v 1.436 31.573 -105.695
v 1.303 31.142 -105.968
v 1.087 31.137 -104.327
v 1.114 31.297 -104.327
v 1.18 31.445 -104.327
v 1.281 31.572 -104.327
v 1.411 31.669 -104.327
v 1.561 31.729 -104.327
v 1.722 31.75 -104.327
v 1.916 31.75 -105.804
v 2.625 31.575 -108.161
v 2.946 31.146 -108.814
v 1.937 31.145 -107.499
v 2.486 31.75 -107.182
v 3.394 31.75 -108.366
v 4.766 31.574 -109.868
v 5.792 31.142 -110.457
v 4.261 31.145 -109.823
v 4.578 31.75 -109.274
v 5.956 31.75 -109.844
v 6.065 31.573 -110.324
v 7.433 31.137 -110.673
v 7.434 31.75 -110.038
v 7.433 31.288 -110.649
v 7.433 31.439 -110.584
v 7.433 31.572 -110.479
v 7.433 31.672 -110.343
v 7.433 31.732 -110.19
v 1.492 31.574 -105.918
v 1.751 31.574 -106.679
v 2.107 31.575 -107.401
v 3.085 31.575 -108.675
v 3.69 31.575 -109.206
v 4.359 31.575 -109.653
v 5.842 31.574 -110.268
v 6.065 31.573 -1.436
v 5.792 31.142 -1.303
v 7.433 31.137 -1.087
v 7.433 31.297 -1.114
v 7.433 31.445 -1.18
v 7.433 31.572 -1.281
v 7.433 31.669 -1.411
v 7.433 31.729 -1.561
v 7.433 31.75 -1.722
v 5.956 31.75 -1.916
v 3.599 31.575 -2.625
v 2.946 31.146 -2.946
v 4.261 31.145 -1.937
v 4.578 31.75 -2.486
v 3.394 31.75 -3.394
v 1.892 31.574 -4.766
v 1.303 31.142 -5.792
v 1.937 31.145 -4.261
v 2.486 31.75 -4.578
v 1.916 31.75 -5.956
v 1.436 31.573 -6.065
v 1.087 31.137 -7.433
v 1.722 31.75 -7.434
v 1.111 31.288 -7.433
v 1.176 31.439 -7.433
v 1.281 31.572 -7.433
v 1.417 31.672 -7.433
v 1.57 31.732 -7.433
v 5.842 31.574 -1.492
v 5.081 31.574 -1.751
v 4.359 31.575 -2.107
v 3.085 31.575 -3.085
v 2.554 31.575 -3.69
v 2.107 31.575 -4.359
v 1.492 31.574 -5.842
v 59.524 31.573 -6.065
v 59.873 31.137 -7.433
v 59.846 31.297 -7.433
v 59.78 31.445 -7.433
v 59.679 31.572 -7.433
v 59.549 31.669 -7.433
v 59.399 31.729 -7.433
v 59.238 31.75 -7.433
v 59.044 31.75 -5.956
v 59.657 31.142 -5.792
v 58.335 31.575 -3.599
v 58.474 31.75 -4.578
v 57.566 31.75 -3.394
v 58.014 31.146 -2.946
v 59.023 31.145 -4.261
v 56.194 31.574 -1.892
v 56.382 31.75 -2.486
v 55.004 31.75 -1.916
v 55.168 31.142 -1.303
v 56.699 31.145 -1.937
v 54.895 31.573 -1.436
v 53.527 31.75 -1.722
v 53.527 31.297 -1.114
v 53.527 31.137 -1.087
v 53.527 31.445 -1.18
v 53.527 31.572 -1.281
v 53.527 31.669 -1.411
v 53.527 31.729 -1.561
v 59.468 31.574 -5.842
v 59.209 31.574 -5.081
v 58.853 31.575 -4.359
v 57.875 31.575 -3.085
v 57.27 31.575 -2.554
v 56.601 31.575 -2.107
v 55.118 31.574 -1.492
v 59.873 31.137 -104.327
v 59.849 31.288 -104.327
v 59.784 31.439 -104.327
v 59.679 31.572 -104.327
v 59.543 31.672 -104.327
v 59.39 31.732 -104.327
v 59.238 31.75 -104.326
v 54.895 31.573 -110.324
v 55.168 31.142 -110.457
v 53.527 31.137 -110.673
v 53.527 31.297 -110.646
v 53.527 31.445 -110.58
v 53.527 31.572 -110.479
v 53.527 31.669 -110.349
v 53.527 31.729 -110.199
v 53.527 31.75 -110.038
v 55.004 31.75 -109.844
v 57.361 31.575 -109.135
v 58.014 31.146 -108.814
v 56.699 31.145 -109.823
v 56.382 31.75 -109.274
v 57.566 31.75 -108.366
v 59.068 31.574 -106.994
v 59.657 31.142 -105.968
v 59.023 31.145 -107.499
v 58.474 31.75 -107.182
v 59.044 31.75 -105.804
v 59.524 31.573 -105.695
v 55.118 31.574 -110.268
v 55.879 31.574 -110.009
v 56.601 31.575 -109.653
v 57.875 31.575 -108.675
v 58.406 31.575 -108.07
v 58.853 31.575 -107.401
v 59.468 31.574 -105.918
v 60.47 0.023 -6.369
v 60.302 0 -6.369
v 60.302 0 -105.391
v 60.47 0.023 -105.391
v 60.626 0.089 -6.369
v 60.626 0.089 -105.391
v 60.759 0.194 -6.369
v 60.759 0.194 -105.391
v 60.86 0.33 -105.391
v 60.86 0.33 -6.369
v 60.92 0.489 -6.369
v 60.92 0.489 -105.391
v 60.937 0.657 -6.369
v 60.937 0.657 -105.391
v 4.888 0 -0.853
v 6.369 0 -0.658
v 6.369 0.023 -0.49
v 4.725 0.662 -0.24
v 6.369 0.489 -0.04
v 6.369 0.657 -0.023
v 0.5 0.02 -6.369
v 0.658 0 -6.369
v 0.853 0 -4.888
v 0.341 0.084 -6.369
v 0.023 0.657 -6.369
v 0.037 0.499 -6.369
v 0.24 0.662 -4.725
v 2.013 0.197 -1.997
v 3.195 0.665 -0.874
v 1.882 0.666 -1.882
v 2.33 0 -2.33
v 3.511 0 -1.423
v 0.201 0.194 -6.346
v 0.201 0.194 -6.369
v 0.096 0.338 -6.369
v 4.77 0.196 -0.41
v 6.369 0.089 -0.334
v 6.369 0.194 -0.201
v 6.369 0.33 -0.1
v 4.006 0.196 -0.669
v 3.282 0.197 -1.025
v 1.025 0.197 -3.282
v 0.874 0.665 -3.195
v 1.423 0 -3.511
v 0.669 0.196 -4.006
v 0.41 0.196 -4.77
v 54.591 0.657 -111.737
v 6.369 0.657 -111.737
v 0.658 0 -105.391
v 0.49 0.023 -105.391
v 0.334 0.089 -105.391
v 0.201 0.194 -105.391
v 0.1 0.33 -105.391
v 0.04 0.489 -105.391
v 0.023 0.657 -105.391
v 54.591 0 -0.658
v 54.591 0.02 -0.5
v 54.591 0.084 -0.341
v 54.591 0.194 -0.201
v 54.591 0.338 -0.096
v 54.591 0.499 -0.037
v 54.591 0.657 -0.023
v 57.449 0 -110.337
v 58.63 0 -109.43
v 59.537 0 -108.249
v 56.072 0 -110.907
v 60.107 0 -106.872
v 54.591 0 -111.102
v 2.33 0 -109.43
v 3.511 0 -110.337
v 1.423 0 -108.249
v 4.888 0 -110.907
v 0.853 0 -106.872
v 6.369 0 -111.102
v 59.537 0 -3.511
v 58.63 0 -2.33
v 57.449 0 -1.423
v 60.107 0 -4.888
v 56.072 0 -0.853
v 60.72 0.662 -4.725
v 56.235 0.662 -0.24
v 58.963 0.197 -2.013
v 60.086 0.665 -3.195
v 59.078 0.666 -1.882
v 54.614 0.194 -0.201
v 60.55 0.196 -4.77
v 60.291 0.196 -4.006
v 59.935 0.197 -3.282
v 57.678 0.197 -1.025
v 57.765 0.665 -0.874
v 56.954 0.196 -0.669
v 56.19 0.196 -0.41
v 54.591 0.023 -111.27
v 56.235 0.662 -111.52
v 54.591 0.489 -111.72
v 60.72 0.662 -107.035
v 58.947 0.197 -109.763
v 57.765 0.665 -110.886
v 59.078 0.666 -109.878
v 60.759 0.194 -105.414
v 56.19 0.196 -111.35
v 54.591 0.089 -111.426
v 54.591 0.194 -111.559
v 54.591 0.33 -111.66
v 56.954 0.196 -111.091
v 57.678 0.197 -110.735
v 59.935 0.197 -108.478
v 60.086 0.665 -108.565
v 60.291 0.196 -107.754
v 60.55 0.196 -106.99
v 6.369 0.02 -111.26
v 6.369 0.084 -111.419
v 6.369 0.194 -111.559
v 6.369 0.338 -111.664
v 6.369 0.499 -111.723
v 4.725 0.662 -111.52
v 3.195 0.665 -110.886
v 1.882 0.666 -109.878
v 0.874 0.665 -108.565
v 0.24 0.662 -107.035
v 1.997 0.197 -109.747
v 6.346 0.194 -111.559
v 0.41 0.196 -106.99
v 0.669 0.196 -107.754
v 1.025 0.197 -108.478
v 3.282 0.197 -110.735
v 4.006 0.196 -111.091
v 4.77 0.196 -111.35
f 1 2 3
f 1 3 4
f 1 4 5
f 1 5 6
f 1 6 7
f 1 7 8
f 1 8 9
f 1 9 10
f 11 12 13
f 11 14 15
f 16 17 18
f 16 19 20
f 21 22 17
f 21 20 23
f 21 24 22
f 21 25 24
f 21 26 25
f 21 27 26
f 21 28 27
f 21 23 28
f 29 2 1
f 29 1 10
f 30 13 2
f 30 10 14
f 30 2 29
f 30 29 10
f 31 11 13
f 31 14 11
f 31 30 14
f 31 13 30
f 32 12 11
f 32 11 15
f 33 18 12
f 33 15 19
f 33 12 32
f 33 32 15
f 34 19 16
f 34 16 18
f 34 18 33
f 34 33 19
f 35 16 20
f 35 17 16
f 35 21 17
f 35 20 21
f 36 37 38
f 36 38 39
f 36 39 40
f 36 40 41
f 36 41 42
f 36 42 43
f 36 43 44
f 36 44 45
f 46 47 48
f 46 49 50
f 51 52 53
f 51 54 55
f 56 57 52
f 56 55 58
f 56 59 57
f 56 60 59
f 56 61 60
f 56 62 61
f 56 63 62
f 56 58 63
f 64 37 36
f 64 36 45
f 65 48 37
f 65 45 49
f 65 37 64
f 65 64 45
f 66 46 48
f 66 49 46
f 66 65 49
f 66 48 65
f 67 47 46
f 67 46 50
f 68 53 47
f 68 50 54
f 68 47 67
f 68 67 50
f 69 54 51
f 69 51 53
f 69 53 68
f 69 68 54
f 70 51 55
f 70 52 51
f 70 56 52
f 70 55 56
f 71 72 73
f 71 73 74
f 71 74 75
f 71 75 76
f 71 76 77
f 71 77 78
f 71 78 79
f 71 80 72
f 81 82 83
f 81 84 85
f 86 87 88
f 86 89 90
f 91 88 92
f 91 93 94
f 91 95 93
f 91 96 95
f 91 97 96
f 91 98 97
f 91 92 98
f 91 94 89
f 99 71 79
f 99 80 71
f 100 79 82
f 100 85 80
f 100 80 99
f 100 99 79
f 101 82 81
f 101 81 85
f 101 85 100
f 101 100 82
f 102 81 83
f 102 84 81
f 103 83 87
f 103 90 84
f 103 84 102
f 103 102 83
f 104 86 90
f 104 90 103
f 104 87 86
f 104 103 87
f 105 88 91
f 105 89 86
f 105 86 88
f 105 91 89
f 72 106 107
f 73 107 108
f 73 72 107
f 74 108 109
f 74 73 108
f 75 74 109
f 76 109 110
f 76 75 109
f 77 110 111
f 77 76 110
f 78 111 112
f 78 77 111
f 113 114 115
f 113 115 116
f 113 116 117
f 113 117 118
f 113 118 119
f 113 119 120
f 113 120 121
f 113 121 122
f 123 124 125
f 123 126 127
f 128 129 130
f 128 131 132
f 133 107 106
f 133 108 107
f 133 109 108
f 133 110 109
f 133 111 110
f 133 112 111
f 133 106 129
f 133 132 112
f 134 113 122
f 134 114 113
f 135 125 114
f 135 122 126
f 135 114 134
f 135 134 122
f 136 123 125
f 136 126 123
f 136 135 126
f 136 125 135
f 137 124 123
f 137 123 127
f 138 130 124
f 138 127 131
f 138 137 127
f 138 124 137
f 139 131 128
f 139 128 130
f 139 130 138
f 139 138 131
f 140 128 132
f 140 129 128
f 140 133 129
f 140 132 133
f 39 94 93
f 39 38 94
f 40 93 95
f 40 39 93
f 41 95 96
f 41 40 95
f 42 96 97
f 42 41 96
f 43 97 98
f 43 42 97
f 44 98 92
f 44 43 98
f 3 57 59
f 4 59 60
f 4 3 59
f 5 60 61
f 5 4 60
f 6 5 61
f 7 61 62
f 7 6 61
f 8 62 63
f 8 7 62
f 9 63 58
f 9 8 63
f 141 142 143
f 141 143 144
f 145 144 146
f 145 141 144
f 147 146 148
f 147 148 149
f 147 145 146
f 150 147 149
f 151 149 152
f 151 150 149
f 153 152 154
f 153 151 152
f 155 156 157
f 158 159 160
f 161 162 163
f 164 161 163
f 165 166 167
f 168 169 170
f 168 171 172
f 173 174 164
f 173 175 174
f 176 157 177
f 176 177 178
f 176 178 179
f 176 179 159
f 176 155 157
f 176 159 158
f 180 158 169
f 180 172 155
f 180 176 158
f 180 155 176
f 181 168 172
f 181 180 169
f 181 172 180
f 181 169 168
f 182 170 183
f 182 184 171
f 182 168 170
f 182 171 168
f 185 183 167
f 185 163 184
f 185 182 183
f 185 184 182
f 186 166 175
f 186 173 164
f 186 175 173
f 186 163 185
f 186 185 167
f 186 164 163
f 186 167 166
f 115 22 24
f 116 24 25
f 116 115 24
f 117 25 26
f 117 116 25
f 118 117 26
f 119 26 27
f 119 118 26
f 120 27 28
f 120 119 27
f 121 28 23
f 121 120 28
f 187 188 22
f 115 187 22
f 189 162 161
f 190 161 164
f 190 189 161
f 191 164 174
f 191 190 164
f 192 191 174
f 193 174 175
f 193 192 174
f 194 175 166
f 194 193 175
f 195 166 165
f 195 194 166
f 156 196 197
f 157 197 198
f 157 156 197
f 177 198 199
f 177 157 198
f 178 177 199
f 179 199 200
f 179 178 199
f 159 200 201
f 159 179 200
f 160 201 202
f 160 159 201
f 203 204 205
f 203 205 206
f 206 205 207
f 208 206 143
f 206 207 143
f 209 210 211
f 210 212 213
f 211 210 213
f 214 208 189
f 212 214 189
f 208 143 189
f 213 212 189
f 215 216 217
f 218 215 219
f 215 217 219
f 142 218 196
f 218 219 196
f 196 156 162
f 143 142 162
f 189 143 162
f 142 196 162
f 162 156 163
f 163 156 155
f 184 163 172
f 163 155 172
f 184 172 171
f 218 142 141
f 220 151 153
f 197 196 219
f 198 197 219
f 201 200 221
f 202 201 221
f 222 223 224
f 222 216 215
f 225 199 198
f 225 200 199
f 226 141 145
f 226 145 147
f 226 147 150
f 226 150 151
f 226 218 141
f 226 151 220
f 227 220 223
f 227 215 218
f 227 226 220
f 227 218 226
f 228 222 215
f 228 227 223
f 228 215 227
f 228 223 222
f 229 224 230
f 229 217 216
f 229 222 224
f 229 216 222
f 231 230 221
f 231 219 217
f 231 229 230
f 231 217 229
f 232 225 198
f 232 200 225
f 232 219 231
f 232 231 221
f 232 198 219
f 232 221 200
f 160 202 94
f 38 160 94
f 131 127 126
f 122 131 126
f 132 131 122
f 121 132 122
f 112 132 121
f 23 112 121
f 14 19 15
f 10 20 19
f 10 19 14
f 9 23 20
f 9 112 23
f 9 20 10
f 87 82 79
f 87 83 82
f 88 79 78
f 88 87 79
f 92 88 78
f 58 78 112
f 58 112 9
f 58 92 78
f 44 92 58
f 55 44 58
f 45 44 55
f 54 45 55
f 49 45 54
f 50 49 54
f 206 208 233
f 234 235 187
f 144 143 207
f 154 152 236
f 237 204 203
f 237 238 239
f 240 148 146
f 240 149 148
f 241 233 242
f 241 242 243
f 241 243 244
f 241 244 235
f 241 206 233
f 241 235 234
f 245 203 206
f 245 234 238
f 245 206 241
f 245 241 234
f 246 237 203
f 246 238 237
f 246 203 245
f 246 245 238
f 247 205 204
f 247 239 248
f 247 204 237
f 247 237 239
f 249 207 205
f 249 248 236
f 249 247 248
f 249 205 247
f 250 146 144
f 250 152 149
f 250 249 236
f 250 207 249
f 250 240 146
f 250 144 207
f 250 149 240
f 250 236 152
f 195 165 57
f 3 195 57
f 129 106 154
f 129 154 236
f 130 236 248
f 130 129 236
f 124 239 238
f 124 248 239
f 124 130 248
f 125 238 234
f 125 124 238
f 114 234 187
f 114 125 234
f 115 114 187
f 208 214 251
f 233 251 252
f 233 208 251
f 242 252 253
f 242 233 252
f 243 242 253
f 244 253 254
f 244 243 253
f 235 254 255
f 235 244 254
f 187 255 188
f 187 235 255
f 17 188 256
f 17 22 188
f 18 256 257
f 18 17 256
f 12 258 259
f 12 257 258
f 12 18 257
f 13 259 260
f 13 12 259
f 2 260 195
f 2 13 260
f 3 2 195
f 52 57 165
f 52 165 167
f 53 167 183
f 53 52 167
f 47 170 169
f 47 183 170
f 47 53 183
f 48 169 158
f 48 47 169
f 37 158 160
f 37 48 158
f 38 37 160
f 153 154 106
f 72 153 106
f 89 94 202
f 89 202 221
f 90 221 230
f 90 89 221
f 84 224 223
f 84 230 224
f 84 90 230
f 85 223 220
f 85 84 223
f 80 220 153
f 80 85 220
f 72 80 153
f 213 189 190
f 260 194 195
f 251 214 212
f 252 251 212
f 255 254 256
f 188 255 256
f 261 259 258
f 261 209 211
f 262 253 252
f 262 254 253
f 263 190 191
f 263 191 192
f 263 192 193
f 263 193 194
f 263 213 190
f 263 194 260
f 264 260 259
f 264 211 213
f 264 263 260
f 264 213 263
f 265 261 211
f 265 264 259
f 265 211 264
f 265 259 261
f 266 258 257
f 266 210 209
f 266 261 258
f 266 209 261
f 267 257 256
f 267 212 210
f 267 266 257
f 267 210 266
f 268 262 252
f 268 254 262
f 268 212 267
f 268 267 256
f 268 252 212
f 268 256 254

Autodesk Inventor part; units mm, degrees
ref_plane "YZ Plane" through (0, 0, 0) normal (1, 0, 0) x (0, 1, 0)
ref_plane "XZ Plane" through (0, 0, 0) normal (0, 1, 0) x (-1, 0, 0)
ref_plane "XY Plane" through (0, 0, 0) normal (0, 0, 1) x (1, 0, 0)
sketch "Sketch1" plane through (0, 0, 0) normal (0, 1, 0) x (-1, 0, 0)
  line L0 (0, 0) -> (-60.96, 0)
  line L1 (-60.96, 0) -> (-60.96, -111.76)
  line L2 (-60.96, -111.76) -> (0, -111.76)
  line L3 (0, -111.76) -> (0, 0)
  dimension "d0" = 60.96
  dimension "d1" = 111.76
extrude "Extrusion1" add sketch "Sketch1" along normal blind 31.75 draft -2
fillet "Fillet1" radius 6.35 4 edges at (60.4056, 15.875, -0.5544) (60.4056, 15.875, -111.2056) (0.5544, 15.875, -111.2056) (0.5544, 15.875, -0.5544)
fillet "Fillet2" radius 0.635 16 edges at (57.993, 31.75, -2.967) (30.48, 31.75, -1.1087) (2.967, 31.75, -2.967) (1.1087, 31.75, -55.88) (2.967, 31.75, -108.793) (30.48, 31.75, -110.6513) (57.993, 31.75, -108.793) (59.8513, 31.75, -55.88) (59.1017, 0, -109.9017) (30.48, 0, -111.76) (1.8583, 0, -109.9017) (0, 0, -55.88) (1.8583, 0, -1.8583) (30.48, 0, 0) (59.1017, 0, -1.8583) (60.96, 0, -55.88)
properties part number "Compressor" material "Aluminum 6061"
